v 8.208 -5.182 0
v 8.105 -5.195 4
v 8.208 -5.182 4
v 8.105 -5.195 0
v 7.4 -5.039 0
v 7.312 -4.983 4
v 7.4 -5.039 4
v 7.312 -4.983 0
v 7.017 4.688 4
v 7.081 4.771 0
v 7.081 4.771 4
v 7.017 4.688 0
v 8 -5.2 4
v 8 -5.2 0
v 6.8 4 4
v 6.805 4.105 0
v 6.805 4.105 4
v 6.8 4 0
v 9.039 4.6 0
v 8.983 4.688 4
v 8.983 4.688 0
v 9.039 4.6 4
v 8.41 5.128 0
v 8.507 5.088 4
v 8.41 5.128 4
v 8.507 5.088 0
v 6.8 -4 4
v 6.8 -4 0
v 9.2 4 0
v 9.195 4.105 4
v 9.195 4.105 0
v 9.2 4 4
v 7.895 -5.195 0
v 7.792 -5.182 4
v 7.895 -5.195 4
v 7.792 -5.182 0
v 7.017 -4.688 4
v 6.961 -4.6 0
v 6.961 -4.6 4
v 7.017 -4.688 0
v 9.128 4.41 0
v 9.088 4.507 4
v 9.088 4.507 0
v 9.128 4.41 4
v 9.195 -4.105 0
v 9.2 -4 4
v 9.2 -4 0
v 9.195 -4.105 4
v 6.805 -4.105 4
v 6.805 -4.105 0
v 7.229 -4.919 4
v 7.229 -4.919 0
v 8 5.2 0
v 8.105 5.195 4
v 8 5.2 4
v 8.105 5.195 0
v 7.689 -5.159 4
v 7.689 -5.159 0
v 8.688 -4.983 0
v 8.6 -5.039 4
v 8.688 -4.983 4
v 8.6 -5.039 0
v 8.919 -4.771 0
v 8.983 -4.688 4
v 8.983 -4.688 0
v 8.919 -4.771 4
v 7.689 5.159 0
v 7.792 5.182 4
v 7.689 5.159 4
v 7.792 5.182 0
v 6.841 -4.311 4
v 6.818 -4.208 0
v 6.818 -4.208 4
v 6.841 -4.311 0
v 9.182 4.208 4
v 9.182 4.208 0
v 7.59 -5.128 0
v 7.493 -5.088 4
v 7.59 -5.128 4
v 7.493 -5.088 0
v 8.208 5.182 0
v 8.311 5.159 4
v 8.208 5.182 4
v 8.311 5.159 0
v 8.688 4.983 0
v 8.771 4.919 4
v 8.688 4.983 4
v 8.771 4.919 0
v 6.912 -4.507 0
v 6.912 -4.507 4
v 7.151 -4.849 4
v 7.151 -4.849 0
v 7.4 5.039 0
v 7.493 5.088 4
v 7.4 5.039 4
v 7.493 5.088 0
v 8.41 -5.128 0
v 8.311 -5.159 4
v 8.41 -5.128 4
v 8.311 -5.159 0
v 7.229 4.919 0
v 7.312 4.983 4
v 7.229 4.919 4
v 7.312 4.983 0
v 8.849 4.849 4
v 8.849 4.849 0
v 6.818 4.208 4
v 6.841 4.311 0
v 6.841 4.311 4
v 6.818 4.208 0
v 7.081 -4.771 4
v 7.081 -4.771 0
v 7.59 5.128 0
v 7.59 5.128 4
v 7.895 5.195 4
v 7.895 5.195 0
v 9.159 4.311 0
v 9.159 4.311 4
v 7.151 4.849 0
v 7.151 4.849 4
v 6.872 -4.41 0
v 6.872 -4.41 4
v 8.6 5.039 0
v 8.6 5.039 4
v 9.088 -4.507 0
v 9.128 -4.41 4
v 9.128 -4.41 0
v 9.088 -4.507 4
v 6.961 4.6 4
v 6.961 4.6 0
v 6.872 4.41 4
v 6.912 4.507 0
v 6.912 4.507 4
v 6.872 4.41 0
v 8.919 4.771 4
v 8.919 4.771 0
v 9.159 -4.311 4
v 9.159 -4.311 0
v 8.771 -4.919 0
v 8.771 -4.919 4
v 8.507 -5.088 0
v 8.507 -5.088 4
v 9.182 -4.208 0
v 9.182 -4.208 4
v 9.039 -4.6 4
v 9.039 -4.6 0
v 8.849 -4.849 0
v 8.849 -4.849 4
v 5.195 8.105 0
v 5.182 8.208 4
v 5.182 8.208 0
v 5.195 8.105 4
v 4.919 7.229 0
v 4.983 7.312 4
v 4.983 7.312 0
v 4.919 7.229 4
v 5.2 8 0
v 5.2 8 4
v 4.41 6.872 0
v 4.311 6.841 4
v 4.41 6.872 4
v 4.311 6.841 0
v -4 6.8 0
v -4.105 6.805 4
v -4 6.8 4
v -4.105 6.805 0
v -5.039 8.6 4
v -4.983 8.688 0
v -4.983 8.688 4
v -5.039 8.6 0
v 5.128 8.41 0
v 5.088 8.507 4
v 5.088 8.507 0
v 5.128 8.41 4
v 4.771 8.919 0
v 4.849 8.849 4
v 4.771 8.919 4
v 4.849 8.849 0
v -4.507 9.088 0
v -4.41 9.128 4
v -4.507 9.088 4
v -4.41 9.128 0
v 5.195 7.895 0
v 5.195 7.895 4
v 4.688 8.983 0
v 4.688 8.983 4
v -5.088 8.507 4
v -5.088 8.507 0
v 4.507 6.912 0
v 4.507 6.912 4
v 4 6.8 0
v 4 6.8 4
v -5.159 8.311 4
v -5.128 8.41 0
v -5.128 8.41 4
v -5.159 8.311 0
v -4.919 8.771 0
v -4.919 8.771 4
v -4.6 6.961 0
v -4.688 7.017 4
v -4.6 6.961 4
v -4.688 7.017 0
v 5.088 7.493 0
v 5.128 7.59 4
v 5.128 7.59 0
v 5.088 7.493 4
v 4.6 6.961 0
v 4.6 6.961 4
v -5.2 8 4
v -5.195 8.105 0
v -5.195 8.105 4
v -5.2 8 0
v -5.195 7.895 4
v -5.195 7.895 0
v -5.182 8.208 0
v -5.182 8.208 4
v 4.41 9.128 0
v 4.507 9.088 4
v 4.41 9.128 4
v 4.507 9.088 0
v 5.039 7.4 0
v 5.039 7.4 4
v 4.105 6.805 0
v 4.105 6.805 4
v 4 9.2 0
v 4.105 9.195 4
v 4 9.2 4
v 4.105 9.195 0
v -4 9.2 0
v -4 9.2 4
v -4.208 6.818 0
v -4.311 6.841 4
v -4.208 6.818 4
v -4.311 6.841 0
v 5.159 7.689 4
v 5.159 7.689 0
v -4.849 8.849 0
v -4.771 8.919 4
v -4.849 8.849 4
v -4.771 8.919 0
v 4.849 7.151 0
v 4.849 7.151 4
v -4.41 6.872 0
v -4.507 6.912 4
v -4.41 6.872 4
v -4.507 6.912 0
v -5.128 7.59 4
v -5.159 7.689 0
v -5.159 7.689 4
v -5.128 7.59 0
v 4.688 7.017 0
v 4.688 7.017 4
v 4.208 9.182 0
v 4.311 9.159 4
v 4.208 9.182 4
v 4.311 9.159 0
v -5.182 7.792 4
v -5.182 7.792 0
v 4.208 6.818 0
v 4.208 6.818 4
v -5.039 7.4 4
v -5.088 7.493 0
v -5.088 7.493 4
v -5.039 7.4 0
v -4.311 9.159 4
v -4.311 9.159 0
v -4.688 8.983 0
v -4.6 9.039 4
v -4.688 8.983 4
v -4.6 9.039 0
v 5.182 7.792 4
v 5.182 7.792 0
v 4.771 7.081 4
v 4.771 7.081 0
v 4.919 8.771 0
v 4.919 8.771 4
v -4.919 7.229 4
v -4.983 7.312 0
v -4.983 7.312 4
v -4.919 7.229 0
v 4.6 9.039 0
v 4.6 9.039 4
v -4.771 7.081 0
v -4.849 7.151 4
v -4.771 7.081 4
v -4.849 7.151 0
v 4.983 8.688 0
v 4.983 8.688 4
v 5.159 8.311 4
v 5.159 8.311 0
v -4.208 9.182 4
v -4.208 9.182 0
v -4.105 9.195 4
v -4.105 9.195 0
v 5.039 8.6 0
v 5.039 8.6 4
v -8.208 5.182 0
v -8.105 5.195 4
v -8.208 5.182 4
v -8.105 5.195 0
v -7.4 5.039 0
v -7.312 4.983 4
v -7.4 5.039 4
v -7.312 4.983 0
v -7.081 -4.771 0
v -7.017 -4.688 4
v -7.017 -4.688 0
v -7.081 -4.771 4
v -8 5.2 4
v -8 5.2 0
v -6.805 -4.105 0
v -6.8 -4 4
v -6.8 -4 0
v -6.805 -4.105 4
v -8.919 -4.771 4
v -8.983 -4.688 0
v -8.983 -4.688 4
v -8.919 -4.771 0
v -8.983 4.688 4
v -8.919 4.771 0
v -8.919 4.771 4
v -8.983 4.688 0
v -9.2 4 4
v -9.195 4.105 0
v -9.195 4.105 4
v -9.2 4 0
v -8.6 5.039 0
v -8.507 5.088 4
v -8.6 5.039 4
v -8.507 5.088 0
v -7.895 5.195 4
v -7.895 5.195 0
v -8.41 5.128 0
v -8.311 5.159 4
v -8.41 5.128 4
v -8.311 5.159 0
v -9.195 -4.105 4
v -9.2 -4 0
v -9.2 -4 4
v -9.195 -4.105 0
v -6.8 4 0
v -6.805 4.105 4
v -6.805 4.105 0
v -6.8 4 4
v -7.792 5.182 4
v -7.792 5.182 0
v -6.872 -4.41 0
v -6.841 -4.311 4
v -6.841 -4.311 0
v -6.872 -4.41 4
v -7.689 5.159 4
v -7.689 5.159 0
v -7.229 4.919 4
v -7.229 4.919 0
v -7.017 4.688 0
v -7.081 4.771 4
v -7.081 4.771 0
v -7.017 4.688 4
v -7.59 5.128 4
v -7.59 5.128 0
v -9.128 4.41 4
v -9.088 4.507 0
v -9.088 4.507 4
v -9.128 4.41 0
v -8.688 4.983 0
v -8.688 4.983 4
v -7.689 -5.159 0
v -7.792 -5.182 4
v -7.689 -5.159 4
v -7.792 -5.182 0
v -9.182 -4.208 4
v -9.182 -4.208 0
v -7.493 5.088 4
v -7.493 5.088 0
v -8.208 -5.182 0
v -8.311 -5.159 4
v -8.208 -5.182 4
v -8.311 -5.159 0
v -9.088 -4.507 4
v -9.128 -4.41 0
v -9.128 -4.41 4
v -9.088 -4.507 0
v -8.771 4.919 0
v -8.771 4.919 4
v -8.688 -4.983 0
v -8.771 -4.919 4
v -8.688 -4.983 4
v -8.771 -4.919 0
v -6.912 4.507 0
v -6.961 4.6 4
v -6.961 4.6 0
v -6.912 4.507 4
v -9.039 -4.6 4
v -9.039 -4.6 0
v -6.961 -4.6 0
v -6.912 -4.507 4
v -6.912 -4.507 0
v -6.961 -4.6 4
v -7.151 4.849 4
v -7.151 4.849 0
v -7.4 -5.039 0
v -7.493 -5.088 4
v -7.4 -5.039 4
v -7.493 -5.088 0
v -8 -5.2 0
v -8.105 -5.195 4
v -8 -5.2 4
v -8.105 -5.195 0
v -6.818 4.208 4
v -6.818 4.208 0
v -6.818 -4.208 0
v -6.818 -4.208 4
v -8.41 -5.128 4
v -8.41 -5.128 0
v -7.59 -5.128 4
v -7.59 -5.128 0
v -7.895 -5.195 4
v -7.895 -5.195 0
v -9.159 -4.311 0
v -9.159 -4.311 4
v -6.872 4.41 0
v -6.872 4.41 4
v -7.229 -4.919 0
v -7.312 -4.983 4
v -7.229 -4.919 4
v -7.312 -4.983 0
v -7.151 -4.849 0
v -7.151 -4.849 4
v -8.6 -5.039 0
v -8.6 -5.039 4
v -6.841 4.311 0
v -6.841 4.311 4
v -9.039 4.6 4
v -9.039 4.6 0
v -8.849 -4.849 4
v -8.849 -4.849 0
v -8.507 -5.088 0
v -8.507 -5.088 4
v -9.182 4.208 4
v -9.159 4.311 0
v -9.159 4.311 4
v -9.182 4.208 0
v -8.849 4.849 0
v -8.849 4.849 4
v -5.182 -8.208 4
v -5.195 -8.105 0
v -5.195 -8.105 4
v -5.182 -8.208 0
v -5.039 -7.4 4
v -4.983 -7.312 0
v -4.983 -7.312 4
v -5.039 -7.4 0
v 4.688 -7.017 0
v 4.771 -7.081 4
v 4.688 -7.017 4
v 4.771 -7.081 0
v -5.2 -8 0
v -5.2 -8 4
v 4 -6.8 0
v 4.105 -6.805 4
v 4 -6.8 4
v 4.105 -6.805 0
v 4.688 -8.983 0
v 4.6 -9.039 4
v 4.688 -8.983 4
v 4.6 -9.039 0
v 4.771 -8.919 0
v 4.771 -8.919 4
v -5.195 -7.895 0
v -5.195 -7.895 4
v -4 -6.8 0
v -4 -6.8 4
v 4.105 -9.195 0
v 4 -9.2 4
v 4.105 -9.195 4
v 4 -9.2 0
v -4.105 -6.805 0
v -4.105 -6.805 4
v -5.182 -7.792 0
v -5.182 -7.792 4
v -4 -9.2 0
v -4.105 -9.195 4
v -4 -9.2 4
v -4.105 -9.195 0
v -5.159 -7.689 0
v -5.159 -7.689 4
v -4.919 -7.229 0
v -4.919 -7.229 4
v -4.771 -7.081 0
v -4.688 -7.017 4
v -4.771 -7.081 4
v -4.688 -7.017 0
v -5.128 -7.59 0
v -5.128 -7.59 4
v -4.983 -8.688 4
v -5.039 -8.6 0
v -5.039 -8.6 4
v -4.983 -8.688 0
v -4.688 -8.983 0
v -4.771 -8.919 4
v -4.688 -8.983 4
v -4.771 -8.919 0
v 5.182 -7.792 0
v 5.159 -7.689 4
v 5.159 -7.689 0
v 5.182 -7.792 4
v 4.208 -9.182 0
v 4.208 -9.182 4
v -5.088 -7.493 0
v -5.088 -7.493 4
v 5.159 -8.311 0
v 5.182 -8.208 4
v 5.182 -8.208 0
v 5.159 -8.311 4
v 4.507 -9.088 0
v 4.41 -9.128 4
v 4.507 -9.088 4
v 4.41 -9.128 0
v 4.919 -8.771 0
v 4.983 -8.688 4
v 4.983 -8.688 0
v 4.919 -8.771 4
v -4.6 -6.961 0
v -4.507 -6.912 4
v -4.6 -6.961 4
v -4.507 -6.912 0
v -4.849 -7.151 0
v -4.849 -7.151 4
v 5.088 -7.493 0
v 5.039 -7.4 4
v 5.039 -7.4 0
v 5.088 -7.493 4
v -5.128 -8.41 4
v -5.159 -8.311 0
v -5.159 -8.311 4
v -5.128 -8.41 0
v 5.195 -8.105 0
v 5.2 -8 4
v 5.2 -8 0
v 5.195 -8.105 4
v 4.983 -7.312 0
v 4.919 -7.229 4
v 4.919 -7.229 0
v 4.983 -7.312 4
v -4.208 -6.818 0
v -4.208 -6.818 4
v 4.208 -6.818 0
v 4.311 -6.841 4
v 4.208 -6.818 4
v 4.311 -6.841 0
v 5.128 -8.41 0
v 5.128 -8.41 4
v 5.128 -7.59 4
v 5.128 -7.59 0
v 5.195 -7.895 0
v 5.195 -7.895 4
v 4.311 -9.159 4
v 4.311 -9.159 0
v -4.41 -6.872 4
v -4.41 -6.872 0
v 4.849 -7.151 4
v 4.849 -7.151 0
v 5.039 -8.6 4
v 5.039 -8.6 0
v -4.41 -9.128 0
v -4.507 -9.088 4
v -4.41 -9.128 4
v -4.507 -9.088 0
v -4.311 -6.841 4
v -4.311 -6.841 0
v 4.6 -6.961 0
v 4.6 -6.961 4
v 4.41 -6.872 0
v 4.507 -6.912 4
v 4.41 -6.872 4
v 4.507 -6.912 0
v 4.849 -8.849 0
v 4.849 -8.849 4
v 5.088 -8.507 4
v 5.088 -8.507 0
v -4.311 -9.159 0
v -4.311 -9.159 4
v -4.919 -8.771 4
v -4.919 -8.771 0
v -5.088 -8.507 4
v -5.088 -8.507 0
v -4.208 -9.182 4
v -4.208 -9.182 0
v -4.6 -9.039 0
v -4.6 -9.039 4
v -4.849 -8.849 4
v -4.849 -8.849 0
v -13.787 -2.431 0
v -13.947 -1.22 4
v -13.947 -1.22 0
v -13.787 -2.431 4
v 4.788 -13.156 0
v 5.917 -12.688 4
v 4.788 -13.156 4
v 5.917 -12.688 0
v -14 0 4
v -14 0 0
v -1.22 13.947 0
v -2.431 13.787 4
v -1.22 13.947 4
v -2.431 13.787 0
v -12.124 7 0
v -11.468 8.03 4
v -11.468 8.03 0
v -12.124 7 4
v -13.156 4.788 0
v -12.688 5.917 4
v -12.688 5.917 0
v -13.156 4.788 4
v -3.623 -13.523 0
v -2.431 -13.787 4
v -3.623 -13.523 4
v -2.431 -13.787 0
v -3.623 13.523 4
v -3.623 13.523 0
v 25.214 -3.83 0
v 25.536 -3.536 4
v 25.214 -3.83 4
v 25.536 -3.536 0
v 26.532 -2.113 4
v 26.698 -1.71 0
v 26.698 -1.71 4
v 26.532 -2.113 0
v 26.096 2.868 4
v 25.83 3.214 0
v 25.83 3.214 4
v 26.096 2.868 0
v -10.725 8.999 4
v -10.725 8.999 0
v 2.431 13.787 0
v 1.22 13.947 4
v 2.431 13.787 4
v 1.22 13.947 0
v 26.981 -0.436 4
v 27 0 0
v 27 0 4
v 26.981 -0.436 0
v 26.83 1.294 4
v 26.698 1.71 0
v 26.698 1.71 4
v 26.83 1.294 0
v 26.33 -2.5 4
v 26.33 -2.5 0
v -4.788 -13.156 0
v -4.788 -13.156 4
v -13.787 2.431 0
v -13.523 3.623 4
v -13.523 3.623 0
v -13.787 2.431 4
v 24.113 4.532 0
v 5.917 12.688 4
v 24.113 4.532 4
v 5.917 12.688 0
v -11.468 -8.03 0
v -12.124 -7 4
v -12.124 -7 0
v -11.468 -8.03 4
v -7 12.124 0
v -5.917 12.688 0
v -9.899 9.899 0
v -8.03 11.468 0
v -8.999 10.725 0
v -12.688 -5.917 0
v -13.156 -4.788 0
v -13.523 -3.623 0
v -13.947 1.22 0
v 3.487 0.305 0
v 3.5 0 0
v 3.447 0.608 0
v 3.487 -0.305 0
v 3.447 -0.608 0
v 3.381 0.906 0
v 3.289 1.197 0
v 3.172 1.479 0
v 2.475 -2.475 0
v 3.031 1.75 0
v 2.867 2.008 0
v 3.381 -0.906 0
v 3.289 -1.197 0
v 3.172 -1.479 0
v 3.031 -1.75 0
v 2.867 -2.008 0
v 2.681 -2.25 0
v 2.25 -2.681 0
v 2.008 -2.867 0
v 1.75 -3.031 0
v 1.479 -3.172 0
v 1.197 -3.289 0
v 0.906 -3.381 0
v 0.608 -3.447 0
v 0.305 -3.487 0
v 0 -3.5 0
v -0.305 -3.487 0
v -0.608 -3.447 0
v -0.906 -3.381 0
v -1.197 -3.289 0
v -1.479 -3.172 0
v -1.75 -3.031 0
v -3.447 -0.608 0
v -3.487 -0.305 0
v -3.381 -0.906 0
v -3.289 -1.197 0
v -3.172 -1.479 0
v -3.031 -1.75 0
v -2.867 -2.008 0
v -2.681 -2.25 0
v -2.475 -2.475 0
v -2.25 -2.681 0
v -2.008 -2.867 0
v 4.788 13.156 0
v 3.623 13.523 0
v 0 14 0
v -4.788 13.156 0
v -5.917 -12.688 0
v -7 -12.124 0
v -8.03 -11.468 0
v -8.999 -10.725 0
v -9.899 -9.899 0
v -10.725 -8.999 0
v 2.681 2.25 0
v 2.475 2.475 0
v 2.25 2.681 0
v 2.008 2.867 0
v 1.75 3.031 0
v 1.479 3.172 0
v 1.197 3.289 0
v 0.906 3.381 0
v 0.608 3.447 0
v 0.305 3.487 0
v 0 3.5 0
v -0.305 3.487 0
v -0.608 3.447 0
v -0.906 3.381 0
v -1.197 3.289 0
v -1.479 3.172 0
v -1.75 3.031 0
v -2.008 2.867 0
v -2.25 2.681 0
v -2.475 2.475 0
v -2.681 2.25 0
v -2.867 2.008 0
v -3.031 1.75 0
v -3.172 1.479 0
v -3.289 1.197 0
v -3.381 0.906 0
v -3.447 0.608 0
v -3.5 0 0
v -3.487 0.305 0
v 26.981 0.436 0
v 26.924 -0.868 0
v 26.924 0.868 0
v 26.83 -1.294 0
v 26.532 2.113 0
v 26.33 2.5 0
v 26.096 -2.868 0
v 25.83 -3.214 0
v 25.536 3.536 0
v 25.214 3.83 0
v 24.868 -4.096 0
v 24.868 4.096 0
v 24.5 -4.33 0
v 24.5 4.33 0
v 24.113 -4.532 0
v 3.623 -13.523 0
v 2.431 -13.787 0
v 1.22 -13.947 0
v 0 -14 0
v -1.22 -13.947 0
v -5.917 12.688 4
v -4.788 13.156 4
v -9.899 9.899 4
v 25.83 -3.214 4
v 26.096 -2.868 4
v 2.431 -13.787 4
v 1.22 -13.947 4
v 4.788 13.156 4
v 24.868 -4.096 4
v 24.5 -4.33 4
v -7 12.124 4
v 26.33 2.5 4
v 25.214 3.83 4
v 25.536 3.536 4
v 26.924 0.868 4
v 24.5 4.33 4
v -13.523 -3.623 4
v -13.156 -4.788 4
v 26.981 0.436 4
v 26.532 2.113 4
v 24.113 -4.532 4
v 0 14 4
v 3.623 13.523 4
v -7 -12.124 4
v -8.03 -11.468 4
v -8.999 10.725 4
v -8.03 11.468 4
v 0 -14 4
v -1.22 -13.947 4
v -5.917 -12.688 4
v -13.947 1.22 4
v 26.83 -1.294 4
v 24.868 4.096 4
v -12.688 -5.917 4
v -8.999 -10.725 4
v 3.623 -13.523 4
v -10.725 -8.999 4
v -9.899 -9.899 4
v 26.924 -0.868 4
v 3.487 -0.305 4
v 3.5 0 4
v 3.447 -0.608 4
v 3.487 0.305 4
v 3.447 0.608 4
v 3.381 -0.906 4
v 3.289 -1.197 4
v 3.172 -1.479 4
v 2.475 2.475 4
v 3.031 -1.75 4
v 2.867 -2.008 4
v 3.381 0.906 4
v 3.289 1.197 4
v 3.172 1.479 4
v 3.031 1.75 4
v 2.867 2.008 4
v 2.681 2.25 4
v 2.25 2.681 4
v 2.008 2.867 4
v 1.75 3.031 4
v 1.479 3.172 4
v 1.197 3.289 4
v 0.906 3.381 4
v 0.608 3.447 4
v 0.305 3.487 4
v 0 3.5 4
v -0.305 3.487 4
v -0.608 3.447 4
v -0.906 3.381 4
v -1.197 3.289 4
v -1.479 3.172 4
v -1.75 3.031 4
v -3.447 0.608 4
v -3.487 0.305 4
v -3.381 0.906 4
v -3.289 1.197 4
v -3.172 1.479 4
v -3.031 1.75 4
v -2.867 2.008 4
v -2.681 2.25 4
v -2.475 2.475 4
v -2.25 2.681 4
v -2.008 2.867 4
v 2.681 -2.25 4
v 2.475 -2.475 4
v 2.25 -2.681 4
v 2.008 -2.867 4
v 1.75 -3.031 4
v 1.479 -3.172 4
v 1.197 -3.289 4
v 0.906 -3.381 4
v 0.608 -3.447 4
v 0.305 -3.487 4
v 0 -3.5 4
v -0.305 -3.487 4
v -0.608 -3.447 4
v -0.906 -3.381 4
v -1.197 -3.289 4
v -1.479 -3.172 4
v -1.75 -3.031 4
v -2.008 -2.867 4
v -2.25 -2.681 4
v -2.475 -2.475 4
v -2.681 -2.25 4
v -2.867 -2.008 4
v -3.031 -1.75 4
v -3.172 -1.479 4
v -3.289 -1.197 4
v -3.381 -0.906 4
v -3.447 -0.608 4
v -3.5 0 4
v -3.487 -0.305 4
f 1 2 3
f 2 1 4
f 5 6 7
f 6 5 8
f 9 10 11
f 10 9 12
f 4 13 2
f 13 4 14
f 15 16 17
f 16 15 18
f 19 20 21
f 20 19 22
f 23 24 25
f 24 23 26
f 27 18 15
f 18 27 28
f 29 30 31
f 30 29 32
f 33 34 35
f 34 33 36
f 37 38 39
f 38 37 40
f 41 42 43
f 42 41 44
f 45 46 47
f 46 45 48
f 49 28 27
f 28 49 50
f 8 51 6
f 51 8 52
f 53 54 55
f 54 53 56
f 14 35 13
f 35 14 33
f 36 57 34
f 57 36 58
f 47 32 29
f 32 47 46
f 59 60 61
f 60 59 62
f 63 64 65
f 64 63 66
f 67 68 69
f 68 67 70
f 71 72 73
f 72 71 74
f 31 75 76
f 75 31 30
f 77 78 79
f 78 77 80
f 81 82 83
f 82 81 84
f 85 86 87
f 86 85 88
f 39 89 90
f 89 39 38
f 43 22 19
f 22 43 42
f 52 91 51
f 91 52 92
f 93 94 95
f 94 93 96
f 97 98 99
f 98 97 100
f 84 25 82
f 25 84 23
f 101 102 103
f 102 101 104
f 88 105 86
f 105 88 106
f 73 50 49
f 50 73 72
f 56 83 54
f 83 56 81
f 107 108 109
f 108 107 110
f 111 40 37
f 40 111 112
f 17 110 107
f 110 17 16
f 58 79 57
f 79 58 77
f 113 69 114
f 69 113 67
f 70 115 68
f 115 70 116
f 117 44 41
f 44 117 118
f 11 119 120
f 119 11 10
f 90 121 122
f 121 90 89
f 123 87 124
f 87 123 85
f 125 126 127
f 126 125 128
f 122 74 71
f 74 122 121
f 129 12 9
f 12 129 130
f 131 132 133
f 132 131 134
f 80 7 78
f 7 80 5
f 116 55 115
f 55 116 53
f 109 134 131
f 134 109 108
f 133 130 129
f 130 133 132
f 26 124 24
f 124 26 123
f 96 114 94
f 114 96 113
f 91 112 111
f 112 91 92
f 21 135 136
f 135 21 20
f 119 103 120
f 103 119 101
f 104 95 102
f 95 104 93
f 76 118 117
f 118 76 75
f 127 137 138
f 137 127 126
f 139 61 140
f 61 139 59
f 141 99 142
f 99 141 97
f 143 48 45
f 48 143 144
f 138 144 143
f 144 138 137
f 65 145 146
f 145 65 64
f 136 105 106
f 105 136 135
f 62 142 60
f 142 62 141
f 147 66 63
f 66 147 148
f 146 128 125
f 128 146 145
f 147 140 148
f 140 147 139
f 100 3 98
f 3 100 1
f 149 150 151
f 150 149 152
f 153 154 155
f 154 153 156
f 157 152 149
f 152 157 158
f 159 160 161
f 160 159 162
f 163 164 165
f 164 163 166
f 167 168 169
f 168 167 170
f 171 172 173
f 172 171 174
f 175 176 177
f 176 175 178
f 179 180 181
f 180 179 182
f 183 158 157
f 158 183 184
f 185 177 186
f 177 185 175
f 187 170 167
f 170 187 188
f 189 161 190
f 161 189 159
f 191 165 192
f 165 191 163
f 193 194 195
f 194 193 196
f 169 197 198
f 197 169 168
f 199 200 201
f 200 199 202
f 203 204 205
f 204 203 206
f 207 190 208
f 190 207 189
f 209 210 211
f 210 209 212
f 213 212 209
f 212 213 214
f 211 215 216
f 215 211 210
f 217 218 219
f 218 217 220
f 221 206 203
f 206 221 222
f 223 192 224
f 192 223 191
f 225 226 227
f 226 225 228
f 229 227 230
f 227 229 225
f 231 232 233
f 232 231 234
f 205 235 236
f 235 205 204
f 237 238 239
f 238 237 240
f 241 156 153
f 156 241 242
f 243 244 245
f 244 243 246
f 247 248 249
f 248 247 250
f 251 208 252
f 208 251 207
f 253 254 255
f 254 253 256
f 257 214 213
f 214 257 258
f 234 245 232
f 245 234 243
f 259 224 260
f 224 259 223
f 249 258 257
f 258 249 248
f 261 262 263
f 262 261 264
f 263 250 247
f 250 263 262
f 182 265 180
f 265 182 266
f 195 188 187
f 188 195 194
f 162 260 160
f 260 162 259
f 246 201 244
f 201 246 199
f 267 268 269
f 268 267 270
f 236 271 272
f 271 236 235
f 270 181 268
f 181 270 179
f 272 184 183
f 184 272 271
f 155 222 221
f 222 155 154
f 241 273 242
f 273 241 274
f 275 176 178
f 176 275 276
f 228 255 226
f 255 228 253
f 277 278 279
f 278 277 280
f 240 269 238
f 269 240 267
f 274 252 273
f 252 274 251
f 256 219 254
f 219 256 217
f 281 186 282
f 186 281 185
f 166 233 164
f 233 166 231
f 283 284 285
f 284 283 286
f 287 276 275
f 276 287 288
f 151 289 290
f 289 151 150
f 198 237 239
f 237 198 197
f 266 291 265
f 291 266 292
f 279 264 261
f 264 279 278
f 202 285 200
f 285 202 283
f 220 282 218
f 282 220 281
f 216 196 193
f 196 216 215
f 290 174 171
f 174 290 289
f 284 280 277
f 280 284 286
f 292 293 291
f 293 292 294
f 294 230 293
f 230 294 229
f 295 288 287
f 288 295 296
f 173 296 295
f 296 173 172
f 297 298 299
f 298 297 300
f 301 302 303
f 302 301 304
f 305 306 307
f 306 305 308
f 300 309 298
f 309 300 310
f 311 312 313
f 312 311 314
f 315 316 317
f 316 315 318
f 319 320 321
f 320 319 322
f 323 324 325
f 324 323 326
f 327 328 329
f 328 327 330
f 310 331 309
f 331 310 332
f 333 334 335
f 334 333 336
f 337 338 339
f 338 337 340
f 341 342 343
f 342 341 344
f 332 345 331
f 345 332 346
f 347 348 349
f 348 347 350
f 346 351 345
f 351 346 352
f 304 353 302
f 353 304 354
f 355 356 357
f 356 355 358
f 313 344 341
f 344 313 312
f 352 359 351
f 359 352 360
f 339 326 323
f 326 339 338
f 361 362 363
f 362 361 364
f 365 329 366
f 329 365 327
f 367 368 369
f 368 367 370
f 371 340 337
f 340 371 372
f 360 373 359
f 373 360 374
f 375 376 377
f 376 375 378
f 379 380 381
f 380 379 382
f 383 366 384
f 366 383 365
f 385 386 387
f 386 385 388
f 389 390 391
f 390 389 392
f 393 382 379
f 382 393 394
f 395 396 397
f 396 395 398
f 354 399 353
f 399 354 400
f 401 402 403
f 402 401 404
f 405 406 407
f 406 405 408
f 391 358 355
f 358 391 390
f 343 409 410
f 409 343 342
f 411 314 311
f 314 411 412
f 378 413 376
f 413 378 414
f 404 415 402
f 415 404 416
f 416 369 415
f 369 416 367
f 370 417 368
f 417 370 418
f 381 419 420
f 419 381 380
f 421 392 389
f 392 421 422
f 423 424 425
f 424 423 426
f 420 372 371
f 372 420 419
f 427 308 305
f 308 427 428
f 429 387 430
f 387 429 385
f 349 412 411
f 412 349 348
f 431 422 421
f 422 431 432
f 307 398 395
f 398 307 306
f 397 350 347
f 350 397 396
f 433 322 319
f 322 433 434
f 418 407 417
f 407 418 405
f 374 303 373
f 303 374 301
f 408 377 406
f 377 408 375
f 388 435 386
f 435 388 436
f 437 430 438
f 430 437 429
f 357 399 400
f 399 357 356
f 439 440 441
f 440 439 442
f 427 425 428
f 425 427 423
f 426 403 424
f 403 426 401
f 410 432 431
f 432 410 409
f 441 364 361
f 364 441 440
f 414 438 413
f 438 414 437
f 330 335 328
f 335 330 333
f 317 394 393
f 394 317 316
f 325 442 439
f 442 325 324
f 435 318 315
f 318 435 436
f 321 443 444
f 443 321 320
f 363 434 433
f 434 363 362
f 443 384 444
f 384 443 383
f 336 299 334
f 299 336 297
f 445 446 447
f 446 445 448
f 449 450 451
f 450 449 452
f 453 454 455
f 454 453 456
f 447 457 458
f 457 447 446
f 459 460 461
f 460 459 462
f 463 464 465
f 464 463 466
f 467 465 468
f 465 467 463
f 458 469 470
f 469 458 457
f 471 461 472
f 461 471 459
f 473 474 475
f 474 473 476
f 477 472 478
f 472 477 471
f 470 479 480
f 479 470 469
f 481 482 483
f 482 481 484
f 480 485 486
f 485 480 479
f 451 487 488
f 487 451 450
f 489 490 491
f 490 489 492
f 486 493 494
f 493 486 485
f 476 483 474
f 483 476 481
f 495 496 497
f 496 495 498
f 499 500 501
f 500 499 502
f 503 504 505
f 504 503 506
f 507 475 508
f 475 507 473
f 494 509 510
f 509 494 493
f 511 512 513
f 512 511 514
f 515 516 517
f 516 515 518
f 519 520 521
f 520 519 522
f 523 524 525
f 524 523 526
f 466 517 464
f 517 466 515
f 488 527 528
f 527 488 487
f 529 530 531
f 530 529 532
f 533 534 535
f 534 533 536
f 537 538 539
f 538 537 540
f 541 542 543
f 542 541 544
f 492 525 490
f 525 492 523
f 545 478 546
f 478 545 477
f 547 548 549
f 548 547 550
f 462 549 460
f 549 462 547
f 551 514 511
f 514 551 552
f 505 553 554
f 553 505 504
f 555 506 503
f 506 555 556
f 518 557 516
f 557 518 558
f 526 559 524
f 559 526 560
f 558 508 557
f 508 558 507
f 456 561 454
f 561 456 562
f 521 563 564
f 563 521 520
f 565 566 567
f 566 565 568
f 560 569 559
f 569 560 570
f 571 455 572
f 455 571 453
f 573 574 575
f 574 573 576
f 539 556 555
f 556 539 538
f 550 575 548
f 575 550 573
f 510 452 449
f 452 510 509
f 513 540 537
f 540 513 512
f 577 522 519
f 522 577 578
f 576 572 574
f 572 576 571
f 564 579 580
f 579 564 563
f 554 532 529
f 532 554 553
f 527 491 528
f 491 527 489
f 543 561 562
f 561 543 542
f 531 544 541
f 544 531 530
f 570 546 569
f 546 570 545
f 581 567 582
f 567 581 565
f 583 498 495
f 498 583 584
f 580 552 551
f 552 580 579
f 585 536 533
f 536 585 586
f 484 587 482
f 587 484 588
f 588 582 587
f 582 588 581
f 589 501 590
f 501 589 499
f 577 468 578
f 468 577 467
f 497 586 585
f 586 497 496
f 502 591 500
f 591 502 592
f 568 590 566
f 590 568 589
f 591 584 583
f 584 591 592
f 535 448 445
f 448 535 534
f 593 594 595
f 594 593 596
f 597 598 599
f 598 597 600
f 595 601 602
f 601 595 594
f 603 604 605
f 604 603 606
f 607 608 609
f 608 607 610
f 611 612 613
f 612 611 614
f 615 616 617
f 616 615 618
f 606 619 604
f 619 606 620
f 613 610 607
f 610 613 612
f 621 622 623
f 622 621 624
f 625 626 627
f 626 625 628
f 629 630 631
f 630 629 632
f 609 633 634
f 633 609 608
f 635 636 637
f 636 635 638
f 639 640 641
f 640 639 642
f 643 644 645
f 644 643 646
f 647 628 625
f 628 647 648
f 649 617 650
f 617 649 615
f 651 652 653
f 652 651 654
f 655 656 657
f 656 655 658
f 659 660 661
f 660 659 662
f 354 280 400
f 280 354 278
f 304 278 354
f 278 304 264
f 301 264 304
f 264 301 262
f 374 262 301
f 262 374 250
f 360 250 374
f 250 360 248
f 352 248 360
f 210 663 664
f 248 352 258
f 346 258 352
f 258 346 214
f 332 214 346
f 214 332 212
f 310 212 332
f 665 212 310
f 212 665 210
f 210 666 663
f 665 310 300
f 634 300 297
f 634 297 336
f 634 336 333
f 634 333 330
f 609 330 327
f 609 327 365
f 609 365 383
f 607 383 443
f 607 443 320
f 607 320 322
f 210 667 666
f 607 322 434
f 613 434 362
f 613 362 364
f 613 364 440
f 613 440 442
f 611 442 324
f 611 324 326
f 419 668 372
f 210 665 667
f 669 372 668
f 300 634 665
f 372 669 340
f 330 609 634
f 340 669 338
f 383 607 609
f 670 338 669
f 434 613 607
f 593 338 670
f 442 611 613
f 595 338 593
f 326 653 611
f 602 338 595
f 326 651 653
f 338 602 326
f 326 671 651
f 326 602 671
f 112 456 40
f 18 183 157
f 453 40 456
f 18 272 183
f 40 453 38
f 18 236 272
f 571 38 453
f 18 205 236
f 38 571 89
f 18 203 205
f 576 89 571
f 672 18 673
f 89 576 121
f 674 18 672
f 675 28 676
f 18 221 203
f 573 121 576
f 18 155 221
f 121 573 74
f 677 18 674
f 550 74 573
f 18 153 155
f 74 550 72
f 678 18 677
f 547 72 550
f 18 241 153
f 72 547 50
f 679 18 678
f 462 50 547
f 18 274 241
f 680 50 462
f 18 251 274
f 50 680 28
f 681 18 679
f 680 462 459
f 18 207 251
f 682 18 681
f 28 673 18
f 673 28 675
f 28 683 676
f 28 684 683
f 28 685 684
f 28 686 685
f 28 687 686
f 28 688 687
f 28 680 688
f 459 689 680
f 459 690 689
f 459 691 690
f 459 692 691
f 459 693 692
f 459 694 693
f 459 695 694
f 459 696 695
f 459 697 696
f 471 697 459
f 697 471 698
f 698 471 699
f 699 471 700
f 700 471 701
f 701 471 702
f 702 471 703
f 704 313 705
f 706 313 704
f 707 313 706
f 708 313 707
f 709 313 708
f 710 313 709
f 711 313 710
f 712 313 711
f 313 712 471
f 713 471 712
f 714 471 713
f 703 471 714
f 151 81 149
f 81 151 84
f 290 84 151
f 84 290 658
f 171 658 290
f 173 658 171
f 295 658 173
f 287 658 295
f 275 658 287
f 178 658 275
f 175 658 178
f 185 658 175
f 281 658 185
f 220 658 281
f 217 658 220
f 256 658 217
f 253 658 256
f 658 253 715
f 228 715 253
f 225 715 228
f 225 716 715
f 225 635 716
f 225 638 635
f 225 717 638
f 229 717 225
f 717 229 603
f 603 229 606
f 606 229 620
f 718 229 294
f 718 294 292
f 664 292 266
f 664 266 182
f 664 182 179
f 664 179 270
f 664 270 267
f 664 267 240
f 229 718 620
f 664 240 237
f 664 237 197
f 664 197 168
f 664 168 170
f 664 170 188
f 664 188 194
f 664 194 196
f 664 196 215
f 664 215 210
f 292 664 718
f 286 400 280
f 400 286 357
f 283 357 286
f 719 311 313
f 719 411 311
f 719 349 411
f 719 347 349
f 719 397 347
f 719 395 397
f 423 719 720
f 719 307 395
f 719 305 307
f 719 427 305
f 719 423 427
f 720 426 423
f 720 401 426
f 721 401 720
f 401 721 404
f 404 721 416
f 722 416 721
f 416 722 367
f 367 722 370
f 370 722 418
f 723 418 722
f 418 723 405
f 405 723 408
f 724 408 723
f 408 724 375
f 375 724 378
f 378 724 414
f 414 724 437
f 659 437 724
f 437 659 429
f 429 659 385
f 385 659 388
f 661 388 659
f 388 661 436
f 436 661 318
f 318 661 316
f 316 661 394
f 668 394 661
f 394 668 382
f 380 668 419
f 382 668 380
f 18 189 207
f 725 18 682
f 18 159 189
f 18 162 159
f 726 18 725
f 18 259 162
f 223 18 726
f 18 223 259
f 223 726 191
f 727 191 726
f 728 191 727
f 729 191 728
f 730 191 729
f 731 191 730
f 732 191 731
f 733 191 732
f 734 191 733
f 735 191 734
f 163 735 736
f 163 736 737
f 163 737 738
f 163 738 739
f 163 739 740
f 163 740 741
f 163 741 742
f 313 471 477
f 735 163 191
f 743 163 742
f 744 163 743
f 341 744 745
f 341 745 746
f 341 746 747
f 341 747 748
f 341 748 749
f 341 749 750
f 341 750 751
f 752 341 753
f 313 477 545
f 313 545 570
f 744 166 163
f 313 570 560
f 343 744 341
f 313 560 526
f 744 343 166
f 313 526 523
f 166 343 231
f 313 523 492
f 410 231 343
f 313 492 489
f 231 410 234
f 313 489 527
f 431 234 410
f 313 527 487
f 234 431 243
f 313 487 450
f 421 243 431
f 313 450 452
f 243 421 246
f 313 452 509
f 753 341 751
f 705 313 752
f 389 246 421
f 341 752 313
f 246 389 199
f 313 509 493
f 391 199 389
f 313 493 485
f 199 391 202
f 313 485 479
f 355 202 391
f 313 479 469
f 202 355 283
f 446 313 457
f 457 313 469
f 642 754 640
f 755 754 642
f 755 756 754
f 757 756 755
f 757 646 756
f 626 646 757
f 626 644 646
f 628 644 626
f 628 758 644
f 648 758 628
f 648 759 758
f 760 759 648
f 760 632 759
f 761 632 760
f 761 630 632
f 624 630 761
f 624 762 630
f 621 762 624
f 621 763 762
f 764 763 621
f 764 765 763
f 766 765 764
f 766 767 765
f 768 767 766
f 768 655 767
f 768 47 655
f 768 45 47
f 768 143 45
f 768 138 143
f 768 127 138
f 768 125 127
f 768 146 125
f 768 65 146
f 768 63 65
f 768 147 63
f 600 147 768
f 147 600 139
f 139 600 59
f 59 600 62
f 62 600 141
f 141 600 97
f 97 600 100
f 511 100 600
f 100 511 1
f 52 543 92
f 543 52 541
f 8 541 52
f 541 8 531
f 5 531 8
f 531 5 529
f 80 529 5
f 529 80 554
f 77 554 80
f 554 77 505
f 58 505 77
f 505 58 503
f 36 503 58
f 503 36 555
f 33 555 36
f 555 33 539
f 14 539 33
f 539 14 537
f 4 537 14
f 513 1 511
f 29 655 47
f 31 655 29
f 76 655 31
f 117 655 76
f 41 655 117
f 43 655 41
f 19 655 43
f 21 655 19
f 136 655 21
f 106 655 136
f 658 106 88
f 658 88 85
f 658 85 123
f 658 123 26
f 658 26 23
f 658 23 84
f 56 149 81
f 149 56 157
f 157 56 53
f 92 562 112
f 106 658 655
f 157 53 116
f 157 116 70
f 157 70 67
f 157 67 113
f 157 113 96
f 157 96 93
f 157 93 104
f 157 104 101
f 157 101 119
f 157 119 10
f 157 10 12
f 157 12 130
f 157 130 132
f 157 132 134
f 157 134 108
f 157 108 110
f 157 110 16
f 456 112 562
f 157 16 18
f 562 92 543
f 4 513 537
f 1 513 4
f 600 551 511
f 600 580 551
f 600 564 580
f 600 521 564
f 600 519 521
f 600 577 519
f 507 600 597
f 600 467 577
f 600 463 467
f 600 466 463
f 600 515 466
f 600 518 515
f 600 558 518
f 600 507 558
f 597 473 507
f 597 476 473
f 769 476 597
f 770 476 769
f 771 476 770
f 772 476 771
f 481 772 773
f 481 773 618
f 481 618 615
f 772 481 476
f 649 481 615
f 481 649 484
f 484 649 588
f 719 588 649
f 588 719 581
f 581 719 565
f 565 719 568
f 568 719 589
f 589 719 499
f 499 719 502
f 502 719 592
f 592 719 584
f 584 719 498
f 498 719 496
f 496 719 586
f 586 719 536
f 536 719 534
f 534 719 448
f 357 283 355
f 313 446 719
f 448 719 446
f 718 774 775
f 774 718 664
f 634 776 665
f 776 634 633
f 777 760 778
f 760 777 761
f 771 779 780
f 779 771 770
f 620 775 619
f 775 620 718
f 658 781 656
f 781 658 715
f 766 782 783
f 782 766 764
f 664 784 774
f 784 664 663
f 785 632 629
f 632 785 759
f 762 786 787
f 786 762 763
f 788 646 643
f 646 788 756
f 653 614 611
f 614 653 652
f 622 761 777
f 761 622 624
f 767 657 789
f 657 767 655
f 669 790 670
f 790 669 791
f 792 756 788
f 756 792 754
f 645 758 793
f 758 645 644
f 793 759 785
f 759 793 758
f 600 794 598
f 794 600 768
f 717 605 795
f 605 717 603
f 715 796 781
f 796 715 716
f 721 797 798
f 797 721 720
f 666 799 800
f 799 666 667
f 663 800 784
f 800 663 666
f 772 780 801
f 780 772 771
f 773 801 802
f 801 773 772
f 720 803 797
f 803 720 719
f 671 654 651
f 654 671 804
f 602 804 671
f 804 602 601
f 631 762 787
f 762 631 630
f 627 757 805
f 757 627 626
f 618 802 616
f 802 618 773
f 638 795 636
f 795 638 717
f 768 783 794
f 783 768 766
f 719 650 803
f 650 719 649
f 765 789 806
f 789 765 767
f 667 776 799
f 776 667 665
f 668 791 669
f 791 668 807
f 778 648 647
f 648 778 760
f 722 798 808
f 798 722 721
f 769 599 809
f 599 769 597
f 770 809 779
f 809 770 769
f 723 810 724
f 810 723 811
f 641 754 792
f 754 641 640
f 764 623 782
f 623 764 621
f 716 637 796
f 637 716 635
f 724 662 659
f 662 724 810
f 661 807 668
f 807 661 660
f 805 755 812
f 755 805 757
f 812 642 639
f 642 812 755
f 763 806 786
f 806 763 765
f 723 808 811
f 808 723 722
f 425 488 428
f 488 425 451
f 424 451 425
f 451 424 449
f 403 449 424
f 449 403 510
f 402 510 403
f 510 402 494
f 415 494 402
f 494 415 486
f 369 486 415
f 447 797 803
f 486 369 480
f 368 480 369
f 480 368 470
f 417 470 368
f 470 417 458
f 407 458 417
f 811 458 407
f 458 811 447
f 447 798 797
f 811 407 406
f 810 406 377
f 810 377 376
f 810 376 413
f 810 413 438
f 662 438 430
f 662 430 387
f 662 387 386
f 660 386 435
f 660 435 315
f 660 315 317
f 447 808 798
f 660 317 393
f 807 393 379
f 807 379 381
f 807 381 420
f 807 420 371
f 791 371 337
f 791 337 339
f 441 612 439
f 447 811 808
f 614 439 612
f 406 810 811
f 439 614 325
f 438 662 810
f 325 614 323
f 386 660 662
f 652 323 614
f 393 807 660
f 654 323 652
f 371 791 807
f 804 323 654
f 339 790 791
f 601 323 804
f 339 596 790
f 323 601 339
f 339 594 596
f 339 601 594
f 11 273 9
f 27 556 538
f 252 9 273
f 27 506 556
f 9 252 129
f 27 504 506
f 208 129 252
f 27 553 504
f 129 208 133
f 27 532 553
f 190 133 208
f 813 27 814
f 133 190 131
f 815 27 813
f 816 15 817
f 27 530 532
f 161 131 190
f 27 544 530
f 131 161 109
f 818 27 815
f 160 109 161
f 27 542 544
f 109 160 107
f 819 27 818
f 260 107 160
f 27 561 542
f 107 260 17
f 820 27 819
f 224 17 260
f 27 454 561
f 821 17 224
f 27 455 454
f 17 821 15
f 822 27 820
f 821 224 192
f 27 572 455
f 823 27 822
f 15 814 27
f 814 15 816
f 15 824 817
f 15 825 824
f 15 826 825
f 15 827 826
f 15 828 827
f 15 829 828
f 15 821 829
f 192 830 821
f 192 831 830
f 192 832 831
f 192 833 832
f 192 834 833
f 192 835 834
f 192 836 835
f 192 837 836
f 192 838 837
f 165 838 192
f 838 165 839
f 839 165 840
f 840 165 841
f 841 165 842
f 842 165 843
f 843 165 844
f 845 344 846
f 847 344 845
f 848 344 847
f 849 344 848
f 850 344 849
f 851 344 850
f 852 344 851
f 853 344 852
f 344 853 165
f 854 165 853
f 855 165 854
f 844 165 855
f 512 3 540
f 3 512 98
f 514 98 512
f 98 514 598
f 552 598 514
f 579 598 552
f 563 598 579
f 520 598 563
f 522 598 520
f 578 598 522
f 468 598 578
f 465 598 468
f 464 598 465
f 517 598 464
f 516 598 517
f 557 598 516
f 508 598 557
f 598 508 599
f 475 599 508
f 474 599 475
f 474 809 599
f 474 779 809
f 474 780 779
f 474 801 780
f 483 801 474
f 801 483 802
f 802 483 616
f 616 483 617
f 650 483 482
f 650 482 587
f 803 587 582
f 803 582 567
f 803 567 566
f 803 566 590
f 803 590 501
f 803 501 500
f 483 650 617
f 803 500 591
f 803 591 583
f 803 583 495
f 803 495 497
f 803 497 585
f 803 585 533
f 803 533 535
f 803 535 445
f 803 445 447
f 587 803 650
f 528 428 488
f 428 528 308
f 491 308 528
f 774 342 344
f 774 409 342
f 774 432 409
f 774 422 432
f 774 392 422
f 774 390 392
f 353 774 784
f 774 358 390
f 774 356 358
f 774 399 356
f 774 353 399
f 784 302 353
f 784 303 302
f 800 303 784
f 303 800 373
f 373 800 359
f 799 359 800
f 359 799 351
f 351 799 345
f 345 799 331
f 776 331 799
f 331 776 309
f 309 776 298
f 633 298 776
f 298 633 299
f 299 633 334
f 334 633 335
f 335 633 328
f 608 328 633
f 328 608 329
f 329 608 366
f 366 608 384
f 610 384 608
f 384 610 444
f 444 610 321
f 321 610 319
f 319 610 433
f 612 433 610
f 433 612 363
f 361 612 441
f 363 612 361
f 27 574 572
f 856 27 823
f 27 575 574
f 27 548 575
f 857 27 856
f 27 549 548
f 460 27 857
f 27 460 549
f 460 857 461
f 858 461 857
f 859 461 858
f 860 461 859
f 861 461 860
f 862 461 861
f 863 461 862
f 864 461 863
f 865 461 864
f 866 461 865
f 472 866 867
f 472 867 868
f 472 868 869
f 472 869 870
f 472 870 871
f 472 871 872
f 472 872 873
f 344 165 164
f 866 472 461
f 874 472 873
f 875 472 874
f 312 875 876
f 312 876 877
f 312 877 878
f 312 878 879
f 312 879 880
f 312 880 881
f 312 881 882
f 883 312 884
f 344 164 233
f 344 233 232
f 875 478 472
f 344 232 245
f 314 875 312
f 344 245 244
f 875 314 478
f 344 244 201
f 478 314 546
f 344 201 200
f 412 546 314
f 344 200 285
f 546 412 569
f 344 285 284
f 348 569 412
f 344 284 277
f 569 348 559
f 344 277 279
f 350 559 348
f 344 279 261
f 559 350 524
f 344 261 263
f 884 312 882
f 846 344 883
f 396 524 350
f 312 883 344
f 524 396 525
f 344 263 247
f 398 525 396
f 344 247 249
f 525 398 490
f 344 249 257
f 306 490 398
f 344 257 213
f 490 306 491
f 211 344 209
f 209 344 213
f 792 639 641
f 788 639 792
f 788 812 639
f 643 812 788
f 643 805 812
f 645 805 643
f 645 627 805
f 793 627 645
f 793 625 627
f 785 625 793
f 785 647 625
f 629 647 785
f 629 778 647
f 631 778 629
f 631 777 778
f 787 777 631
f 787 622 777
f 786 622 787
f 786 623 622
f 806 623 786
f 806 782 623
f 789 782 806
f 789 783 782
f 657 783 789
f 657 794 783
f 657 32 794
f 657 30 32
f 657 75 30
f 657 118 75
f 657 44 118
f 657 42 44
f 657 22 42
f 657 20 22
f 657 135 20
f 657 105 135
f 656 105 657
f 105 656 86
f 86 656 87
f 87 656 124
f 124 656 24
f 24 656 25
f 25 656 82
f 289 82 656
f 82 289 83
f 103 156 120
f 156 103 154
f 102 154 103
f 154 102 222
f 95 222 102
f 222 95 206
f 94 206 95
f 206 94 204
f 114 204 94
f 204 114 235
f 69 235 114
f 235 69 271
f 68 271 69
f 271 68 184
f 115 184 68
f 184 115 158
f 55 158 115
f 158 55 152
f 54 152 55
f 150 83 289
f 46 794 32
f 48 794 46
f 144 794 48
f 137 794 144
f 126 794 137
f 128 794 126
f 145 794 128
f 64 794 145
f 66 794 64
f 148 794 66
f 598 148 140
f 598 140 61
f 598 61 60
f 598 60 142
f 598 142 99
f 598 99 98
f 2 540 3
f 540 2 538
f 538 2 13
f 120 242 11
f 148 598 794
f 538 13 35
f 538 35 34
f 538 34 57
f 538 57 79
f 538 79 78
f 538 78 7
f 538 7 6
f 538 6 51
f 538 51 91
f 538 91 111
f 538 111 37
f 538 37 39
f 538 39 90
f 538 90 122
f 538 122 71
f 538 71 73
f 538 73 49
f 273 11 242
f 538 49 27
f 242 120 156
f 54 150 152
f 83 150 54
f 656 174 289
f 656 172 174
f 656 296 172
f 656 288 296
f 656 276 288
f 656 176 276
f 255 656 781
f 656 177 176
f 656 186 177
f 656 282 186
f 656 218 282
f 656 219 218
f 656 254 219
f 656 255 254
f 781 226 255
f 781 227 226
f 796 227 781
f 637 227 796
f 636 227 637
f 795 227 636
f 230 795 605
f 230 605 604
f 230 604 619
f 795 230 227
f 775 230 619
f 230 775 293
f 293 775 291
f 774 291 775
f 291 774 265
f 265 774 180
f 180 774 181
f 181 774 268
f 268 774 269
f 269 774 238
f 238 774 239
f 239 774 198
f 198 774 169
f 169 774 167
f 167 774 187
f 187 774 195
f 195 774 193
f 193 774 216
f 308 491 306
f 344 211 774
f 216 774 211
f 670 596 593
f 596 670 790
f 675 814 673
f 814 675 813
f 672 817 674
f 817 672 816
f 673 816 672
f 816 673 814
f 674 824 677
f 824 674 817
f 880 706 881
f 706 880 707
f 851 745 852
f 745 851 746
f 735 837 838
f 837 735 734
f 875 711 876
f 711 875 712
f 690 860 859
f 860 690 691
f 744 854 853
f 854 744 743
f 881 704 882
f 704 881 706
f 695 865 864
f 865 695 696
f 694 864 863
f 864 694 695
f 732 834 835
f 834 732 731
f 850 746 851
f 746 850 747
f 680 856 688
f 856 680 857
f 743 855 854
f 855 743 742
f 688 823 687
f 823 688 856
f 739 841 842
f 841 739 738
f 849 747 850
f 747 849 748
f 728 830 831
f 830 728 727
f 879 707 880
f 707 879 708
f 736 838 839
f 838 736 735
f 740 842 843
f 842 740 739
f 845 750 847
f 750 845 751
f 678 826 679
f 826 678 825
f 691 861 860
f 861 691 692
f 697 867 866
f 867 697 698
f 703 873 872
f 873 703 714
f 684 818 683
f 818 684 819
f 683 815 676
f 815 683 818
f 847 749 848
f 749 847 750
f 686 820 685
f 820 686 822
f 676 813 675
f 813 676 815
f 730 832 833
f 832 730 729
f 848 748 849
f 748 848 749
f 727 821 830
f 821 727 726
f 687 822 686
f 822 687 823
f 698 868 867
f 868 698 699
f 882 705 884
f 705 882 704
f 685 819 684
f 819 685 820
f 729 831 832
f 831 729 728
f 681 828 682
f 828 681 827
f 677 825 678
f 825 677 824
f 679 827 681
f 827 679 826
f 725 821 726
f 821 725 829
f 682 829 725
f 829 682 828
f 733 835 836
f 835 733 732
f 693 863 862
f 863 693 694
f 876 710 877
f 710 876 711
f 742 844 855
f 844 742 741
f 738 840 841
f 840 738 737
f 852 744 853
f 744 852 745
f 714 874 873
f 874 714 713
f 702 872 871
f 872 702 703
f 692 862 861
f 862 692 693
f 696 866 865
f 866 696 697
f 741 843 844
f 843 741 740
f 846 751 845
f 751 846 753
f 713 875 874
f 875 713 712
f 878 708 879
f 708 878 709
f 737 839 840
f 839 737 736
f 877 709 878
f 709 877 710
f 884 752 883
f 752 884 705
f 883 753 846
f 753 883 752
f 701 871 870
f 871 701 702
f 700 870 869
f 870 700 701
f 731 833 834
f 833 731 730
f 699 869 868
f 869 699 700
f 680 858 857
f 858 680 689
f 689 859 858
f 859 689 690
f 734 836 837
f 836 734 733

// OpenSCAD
// file: woli_config.scad
// ============================================================
// WOLI V1.1 AUDITED FINAL — MASTER PARAMETERS
// Units: mm
// ============================================================

$fn = 72;

// ---------- GLOBAL ----------
fit_clearance = 0.40;
wall = 3.0;
floor_t = 5.0;
cover_t = 2.8;
shell_r = 10.0;

m3_clear = 3.4;
m3_pilot_d = 2.8;
m3_pilot_depth = 4.2;

tie_slot_w = 3.8;
tie_slot_l = 18;

// ---------- BODY ----------
body_w = 170;
body_l = 90;
chassis_h = 31;
top_h = 34;

top_upper_w = 162;
top_upper_l = 80;
top_upper_r = 9;

// ---------- N20 DRIVE ----------
wheel_d = 43;
wheel_w = 17.5;

n20_x = 12;
n20_y = 33;
n20_z = 10;

n20_bracket_x = 25;
n20_bracket_y = 8.5;
n20_bracket_z = 11.5;
n20_bracket_hole_cc = 17;      // approx; slots absorb error

wheel_axis_ground_z = wheel_d/2; // reference only; actual chassis ground plane requires hardware check
wheel_opening_l = 25;            // side wheel cutout depth (Y), mm
motor_y = -body_l/2 + body_l/3;  // wheel center: 1/3 body depth in from front (-Y)
motor_slot_len = 8;
motor_bracket_zone_x = body_w/2 - 18;

// ---------- BALL CASTER ----------
caster_w = 22;
caster_l = 17;
caster_h = 15;
caster_ball_d_visual_ref = 11.5; // photo-only reference; not used for fit
caster_dock_y = body_l/2 - 21;

caster_body_clear = 0.7;
caster_retainer_t = 3.0;
caster_retainer_screw_cc = 27;

caster_mount_x = 15;
caster_mount_y = 12;
caster_floor_open = 18.5;

// ---------- MAIN PCB ----------
pcb_w = 50;
pcb_l = 70;
pcb_stack_h = 15;

pcb_tray_w = 56;
pcb_tray_l = 76;
pcb_mount_cc_x = 44;
pcb_mount_cc_y = 64;

// ---------- MG90S ----------
servo_a = 32.4;
servo_b = 32.5;
servo_c = 12;
servo_fit = 0.7;

// ---------- LIMIT SWITCH ----------
limit_w = 21;
limit_l = 23;
limit_h = 6;

// ---------- VL53L0X ----------
tof_w = 10.7;
tof_l = 25;
tof_h = 11.5;
tof_rail_clear = 0.7;

tof_bezel_w = 34;
tof_bezel_h = 19;

// ---------- PHONE HOLDER / NECK ----------
phone_ball_d = 18.0;            // physical socket fit still required
neck_h = 30;
neck_base_w = 54;
neck_base_l = 42;
neck_base_h = 5;
neck_hole_x = 38;
neck_hole_y = 26;

neck_recess_w = 62;
neck_recess_l = 50;
neck_recess_d = 1.2;

neck_pilot_d = 2.8;
neck_pilot_depth = 7.0;

// reference phone clearance envelope only
phone_ref_w = 165;
phone_ref_h = 82;
phone_ref_t = 12;

// ---------- KLIFE PD-Q2 BATTERY ----------
battery_w = 68;
battery_l = 143;
battery_h = 11;
battery_mass_g = 205;

battery_fit_clear = 0.8;
battery_tray_w = 84;
battery_tray_l = 146;
battery_tray_t = 2.4;
battery_rail_t = 2.5;
battery_rail_h = 5.5;
battery_center_y = -18;

battery_tray_mount_x = 39;
battery_tray_mount_y = 55;

// ---------- UPPER ELECTRONICS DECK ----------
bridge_w = 122;
bridge_l = 94;
bridge_t = 3.0;
bridge_leg_h = 20;
bridge_leg_x = 56;
bridge_leg_y = 36;

module_boss_h = 4.5;
module_boss_d = 8.0;
module_pilot_d = 2.8;

pcb_deck_cx = -25;
pcb_deck_cy = 0;

tb_deck_cx = 34;
tb_deck_cy = 17;

usbc_deck_cx = 36;
usbc_deck_cy = -24;

// ---------- TB6612FNG HW-166 ----------
tb6612_w = 26;
tb6612_l = 26;
tb6612_clear = 0.6;

// total installed height is intentionally not hard-coded

// ---------- USB-C BREAKOUT ----------
usbc_board_w = 12;
usbc_board_l = 15;
usbc_connector_h = 4.2;
usbc_clear = 0.6;

// ---------- TOP COVER INTERFACE ----------
cover_skirt_depth = 4.0;
cover_skirt_clear = 0.8;
cover_skirt_t = 2.5;

cover_side_screw_y = 55 * body_l / 190;
cover_side_screw_z = -2.5;

rear_service_w = 42;
rear_service_h = 14;
rear_hatch_screw_x = 19;
rear_hatch_center_z = 10;

// ---------- CABLE MANAGEMENT ----------
cable_bridge_w = 24;
cable_bridge_l = 14;
cable_bridge_h = 8;
cable_bridge_channel = 8;

// ---------- SERVO LOCK FRAMEWORK ----------
lock_angle_deg = 90;
unlock_angle_deg = 10;

lock_plate_d = 28;
lock_arm_w = 10;
lock_arm_t = 4.0;
lock_reach = 22;
lock_tip_d = 10;

horn_center_clear_d = 7.0;
horn_slot_d = 2.4;              // physical stock-horn check required
horn_slot_len = 8.0;
horn_slot_radius = 8.0;

lock_pad_t = 2.0;
lock_pad_d = 11.0;
// file: woli_lib.scad
include <woli_config.scad>;

module rr2d(w,l,r){
    offset(r=r) square([w-2*r,l-2*r], center=true);
}

module rplate(w,l,h,r){
    linear_extrude(height=h) rr2d(w,l,r);
}

module rshell(w,l,h,r,t,bottom){
    difference(){
        rplate(w,l,h,r);
        translate([0,0,bottom])
            rplate(w-2*t,l-2*t,h,r-t);
    }
}

module slot2d(len,d){
    hull(){
        translate([-len/2,0]) circle(d=d);
        translate([ len/2,0]) circle(d=d);
    }
}

module slot3d(len,d,h){
    linear_extrude(height=h) slot2d(len,d);
}

module tie_slot(h=5){
    rplate(tie_slot_w,tie_slot_l,h,1.2);
}

module body_screw_pattern(h=20){
    for(x=[-screw_x,screw_x])
        for(y=[-screw_y,screw_y])
            translate([x,y,-1])
                cylinder(h=h,d=m3_clear);
}

module body_bosses(h=20){
    for(x=[-screw_x,screw_x])
        for(y=[-screw_y,screw_y])
            translate([x,y,0])
                cylinder(h=h,d=m3_boss_d);
}


// Closed-top shell for removable upper cover.
// Leaves the underside open and preserves a roof thickness.
module top_shell(w,l,h,r,t){
    difference(){
        rplate(w,l,h,r);
        translate([0,0,-0.1])
            rplate(w-2*t,l-2*t,h-t+0.1,r-t);
    }
}


// Tapered rounded solid built from two rounded plates.
// Useful for product-like enclosure shoulders.
module tapered_rounded_solid(w0,l0,w1,l1,h,r0,r1){
    hull(){
        rplate(w0,l0,0.8,r0);
        translate([0,0,h-0.8])
            rplate(w1,l1,0.8,r1);
    }
}

// Open-bottom tapered cover with closed roof.
module tapered_top_shell(w0,l0,w1,l1,h,r0,r1,t){
    difference(){
        tapered_rounded_solid(w0,l0,w1,l1,h,r0,r1);
        translate([0,0,-0.1])
            tapered_rounded_solid(
                w0-2*t,l0-2*t,
                w1-2*t,l1-2*t,
                h-t+0.1,
                max(r0-t,1),max(r1-t,1)
            );
    }
}
// main file
include <woli_lib.scad>;

// ============================================================
// 23 PARAMETRIC LOCK ARM MODULE V0.7
// Call: lock_arm_custom(reach_mm)
// ============================================================

module lock_arm_custom(reach_mm=22){
    difference(){
        linear_extrude(height=lock_arm_t)
            hull(){
                circle(d=lock_plate_d);
                translate([reach_mm,0]) circle(d=lock_tip_d);
            }

        translate([0,0,-0.1])
            cylinder(h=lock_arm_t+0.3,d=horn_center_clear_d);

        for(a=[0,90,180,270])
            rotate([0,0,a])
                translate([horn_slot_radius,0,-0.1])
                    rotate([0,0,90])
                        slot3d(horn_slot_len,horn_slot_d,lock_arm_t+0.3);
    }
}

// Default preview when opening this file directly.
lock_arm_custom(lock_reach);
